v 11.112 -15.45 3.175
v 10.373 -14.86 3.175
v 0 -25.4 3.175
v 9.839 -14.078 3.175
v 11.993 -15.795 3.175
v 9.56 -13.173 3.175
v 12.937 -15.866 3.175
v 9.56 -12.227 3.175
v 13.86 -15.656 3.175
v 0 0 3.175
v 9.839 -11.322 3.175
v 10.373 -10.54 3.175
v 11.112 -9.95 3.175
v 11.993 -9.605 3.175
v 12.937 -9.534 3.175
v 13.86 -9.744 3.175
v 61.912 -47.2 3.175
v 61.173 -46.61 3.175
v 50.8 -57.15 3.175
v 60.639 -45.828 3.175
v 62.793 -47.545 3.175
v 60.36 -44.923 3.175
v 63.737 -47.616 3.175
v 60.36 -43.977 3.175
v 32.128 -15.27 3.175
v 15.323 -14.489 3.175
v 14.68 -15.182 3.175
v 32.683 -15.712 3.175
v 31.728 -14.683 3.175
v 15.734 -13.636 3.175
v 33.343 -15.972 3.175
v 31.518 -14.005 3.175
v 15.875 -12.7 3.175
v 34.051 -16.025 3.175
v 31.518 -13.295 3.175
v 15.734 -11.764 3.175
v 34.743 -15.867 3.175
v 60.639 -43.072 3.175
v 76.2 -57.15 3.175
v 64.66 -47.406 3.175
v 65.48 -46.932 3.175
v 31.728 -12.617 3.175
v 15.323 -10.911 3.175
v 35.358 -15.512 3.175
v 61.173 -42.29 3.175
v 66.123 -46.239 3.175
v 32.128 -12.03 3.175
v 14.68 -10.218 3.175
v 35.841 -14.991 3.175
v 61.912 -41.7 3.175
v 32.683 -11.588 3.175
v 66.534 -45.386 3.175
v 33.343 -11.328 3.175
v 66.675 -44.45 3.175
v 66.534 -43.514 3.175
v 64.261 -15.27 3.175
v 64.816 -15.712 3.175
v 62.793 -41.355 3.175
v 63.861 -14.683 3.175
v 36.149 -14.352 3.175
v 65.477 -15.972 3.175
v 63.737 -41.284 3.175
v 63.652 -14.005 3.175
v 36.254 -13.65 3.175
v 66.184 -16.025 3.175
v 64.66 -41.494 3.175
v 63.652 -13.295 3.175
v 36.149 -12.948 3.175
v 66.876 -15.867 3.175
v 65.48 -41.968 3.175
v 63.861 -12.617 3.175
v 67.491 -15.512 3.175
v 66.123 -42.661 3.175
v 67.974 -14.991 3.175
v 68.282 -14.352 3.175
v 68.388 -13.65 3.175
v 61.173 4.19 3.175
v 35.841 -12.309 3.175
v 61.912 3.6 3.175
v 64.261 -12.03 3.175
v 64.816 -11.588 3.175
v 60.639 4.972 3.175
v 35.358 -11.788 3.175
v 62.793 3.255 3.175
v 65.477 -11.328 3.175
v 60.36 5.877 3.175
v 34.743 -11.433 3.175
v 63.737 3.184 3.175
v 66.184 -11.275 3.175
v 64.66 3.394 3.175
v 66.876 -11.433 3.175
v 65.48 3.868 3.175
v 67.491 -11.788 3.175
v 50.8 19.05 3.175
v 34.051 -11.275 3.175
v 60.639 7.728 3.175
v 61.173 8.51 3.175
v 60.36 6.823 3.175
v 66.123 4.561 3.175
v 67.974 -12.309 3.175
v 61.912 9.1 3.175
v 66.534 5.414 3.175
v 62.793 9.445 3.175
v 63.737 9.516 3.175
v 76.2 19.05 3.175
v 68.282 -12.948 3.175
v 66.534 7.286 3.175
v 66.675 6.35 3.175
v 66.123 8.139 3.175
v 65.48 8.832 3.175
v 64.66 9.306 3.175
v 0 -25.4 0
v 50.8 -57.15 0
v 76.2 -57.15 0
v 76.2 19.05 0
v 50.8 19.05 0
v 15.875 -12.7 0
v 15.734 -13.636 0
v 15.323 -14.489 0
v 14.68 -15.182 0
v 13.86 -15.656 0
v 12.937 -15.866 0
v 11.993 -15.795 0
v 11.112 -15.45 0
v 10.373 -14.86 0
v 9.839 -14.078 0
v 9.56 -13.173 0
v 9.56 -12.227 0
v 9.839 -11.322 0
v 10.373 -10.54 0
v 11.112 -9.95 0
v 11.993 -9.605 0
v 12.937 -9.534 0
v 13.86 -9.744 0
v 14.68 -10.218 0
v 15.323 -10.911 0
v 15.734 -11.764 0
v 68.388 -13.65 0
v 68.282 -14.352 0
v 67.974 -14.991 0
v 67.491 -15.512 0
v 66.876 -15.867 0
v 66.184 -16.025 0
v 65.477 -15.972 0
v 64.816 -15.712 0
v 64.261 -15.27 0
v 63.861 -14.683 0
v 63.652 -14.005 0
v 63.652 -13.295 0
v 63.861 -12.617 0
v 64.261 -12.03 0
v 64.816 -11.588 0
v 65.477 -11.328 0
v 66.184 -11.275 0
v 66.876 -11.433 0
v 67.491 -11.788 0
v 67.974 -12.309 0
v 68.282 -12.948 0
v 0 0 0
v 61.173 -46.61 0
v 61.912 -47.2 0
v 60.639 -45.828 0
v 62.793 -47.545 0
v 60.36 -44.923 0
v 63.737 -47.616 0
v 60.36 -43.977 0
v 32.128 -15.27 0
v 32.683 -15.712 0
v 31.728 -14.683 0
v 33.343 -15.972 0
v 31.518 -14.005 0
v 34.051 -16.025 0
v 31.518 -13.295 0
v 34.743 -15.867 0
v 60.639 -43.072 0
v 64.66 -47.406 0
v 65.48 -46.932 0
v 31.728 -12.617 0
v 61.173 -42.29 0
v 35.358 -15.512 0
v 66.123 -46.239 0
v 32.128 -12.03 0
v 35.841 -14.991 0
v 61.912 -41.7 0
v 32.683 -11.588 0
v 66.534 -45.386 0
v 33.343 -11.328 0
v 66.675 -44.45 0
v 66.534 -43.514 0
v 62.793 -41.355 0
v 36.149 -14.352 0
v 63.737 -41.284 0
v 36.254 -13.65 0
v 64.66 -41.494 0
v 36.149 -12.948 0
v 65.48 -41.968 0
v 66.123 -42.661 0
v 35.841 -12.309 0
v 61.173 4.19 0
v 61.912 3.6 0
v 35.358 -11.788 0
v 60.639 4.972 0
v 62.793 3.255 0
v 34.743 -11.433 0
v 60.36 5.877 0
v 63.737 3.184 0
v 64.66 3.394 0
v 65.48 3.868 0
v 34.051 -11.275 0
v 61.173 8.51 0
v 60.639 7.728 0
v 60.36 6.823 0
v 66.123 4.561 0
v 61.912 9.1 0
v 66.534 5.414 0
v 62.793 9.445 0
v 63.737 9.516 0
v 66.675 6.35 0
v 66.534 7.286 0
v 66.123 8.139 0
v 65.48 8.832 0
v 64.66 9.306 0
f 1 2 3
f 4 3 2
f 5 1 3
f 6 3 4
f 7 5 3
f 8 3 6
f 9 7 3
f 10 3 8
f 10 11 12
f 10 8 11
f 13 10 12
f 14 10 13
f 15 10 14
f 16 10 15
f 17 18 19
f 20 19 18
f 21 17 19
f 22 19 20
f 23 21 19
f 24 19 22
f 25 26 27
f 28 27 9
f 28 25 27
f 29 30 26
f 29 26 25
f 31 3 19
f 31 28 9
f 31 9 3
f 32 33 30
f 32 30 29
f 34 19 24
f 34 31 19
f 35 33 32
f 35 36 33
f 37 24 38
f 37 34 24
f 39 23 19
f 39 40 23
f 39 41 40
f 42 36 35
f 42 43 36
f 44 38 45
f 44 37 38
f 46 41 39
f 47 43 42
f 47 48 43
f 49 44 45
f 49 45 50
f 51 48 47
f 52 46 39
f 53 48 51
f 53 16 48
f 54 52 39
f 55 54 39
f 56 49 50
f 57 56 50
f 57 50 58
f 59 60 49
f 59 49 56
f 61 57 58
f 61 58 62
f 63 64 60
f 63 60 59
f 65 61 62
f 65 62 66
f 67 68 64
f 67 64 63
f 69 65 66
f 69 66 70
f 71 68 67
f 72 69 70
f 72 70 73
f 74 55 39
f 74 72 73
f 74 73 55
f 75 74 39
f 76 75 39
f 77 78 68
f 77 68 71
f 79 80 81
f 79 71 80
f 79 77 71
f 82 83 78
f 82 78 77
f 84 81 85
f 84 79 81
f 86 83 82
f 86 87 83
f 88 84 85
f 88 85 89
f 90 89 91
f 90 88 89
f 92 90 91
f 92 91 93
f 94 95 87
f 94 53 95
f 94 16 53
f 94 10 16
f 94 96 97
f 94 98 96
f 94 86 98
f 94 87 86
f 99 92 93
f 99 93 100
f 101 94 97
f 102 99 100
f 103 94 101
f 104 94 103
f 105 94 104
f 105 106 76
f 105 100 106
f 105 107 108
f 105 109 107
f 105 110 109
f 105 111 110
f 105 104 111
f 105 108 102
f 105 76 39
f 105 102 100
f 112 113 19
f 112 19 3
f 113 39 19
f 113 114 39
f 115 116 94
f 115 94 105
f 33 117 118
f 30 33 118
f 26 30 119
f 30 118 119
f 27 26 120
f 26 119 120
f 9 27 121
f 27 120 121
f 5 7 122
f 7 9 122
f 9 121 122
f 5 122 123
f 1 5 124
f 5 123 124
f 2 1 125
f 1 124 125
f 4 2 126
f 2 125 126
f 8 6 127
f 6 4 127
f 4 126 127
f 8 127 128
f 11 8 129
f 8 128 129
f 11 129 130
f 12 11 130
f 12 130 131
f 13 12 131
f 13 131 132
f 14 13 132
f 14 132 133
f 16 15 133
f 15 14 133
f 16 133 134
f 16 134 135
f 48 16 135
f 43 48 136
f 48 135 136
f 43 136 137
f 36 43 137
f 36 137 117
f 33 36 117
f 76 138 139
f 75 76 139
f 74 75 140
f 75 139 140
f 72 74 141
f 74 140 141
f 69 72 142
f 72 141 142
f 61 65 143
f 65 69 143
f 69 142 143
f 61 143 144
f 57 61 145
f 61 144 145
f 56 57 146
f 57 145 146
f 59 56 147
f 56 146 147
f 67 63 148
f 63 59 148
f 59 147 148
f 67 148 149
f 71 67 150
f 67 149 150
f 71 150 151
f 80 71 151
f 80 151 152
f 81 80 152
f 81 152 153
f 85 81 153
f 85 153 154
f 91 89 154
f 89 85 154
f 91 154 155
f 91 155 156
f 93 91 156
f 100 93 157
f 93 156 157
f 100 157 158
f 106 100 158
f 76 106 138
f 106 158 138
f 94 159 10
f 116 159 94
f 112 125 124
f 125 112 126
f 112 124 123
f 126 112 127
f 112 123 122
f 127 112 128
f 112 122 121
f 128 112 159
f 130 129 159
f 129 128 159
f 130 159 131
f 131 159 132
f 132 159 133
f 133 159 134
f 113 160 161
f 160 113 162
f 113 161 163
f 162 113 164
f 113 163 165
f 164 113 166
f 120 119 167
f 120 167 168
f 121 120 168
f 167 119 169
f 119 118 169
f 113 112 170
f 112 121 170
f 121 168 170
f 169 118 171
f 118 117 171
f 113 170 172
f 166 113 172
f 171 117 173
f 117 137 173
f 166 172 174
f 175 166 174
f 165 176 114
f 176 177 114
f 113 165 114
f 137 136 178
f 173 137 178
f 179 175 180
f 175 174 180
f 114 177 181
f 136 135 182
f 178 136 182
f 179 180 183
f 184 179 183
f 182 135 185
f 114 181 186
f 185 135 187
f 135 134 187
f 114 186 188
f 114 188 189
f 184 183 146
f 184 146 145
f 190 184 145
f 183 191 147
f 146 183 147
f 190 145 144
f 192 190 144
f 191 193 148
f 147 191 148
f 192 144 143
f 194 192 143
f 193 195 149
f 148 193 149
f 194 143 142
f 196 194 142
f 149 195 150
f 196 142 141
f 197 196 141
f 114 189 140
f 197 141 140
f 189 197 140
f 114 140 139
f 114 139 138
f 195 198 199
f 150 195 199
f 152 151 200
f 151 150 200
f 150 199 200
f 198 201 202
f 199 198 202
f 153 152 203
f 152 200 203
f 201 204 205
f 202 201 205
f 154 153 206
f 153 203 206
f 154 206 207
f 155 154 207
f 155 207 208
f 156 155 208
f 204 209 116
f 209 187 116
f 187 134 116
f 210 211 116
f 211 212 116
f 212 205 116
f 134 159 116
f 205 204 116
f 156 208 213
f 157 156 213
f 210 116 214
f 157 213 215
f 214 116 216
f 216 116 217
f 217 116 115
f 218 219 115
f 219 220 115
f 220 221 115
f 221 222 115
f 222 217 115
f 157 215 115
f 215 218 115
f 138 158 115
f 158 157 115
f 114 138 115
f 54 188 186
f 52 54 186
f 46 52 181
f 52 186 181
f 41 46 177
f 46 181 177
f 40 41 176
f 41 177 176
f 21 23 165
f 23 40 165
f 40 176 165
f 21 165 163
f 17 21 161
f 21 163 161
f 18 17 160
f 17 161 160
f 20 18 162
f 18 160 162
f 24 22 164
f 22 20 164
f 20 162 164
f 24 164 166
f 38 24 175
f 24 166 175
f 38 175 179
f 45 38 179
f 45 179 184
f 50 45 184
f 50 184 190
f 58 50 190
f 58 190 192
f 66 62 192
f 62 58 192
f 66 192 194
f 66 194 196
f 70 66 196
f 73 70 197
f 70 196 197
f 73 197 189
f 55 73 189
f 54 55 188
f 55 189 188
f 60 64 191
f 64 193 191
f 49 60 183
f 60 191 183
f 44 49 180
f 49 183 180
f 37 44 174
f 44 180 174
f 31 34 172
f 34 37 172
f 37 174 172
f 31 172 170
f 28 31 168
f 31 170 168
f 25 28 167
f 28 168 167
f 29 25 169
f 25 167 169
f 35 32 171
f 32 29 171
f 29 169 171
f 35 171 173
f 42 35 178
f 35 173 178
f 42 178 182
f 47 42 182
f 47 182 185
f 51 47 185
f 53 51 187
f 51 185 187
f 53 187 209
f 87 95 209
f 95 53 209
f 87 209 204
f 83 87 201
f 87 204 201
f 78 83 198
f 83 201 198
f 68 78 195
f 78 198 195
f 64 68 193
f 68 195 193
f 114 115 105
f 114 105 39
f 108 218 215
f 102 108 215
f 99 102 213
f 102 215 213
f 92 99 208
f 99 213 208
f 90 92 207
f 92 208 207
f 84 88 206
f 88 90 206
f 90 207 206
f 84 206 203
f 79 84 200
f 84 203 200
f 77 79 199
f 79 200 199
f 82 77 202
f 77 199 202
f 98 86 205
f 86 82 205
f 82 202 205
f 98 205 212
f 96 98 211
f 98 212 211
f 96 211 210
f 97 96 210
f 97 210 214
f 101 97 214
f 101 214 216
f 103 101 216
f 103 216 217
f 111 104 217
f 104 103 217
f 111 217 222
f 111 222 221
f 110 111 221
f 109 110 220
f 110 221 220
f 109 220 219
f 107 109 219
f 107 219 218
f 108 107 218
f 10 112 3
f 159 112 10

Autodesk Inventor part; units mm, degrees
ref_plane "YZ Plane" through (0, 0, 0) normal (1, 0, 0) x (0, 1, 0)
ref_plane "XZ Plane" through (0, 0, 0) normal (0, 1, 0) x (-1, 0, 0)
ref_plane "XY Plane" through (0, 0, 0) normal (0, 0, 1) x (1, 0, 0)
sketch "Sketch1" plane through (0, 0, 0) normal (0, 0, 1) x (1, 0, 0)
  line L0 (0, 0) -> (50.8, 19.05)
  line L1 (50.8, 19.05) -> (76.2, 19.05)
  line L2 (76.2, 19.05) -> (76.2, -57.15)
  line L3 (76.2, -57.15) -> (50.8, -57.15)
  line L4 (50.8, -57.15) -> (0, -25.4)
  line L5 (0, -25.4) -> (0, 0)
  line L6 (76.2, -6.35) -> (26.8732, -6.35) construction
  line L7 (26.8732, -6.35) -> (26.8732, -41.7576) construction
  line L8 (26.8732, -41.7576) -> (76.2, -41.7576) construction
  line L9 (76.2, -41.7576) -> (76.2, -6.35) construction
  circle A0 centre (33.8732, -13.65) radius 2.3813
  circle A1 centre (66.0064, -13.65) radius 2.3813
  line L10 (0, 0) -> (76.2, 0) construction
  circle A2 centre (12.7, -12.7) radius 3.175
  circle A3 centre (63.5, -44.45) radius 3.175
  circle A4 centre (63.5, 6.35) radius 3.175
  dimension "d0" = 25.4
  dimension "d1" = 76.2
  dimension "d2" = 19.05
  dimension "d3" = 76.2
  dimension "d4" = 25.4
  dimension "d5" = 25.4
  dimension "d6" = 49.3268
  dimension "d7" = 35.4076
  dimension "d8" = 25.4
  dimension "d10" = 7.3
  dimension "d11" = 7.3
  dimension "d15" = 10.1936
  dimension "d16" = 7
  dimension "d18" = 6.35
  dimension "d19" = 12.7
  dimension "d20" = 12.7
  dimension "d21" = 6.35
  dimension "d22" = 6.35
  dimension "d23" = 12.7
  dimension "d24" = 12.7
  dimension "d25" = 12.7
  dimension "d26" = 12.7
  dimension "d29" = 4.7625
extrude "Extrusion1" add sketch "Sketch1" along normal blind 3.175
properties part number "15102898-16-P-0309_CPY1" material "Aluminum 6061"
